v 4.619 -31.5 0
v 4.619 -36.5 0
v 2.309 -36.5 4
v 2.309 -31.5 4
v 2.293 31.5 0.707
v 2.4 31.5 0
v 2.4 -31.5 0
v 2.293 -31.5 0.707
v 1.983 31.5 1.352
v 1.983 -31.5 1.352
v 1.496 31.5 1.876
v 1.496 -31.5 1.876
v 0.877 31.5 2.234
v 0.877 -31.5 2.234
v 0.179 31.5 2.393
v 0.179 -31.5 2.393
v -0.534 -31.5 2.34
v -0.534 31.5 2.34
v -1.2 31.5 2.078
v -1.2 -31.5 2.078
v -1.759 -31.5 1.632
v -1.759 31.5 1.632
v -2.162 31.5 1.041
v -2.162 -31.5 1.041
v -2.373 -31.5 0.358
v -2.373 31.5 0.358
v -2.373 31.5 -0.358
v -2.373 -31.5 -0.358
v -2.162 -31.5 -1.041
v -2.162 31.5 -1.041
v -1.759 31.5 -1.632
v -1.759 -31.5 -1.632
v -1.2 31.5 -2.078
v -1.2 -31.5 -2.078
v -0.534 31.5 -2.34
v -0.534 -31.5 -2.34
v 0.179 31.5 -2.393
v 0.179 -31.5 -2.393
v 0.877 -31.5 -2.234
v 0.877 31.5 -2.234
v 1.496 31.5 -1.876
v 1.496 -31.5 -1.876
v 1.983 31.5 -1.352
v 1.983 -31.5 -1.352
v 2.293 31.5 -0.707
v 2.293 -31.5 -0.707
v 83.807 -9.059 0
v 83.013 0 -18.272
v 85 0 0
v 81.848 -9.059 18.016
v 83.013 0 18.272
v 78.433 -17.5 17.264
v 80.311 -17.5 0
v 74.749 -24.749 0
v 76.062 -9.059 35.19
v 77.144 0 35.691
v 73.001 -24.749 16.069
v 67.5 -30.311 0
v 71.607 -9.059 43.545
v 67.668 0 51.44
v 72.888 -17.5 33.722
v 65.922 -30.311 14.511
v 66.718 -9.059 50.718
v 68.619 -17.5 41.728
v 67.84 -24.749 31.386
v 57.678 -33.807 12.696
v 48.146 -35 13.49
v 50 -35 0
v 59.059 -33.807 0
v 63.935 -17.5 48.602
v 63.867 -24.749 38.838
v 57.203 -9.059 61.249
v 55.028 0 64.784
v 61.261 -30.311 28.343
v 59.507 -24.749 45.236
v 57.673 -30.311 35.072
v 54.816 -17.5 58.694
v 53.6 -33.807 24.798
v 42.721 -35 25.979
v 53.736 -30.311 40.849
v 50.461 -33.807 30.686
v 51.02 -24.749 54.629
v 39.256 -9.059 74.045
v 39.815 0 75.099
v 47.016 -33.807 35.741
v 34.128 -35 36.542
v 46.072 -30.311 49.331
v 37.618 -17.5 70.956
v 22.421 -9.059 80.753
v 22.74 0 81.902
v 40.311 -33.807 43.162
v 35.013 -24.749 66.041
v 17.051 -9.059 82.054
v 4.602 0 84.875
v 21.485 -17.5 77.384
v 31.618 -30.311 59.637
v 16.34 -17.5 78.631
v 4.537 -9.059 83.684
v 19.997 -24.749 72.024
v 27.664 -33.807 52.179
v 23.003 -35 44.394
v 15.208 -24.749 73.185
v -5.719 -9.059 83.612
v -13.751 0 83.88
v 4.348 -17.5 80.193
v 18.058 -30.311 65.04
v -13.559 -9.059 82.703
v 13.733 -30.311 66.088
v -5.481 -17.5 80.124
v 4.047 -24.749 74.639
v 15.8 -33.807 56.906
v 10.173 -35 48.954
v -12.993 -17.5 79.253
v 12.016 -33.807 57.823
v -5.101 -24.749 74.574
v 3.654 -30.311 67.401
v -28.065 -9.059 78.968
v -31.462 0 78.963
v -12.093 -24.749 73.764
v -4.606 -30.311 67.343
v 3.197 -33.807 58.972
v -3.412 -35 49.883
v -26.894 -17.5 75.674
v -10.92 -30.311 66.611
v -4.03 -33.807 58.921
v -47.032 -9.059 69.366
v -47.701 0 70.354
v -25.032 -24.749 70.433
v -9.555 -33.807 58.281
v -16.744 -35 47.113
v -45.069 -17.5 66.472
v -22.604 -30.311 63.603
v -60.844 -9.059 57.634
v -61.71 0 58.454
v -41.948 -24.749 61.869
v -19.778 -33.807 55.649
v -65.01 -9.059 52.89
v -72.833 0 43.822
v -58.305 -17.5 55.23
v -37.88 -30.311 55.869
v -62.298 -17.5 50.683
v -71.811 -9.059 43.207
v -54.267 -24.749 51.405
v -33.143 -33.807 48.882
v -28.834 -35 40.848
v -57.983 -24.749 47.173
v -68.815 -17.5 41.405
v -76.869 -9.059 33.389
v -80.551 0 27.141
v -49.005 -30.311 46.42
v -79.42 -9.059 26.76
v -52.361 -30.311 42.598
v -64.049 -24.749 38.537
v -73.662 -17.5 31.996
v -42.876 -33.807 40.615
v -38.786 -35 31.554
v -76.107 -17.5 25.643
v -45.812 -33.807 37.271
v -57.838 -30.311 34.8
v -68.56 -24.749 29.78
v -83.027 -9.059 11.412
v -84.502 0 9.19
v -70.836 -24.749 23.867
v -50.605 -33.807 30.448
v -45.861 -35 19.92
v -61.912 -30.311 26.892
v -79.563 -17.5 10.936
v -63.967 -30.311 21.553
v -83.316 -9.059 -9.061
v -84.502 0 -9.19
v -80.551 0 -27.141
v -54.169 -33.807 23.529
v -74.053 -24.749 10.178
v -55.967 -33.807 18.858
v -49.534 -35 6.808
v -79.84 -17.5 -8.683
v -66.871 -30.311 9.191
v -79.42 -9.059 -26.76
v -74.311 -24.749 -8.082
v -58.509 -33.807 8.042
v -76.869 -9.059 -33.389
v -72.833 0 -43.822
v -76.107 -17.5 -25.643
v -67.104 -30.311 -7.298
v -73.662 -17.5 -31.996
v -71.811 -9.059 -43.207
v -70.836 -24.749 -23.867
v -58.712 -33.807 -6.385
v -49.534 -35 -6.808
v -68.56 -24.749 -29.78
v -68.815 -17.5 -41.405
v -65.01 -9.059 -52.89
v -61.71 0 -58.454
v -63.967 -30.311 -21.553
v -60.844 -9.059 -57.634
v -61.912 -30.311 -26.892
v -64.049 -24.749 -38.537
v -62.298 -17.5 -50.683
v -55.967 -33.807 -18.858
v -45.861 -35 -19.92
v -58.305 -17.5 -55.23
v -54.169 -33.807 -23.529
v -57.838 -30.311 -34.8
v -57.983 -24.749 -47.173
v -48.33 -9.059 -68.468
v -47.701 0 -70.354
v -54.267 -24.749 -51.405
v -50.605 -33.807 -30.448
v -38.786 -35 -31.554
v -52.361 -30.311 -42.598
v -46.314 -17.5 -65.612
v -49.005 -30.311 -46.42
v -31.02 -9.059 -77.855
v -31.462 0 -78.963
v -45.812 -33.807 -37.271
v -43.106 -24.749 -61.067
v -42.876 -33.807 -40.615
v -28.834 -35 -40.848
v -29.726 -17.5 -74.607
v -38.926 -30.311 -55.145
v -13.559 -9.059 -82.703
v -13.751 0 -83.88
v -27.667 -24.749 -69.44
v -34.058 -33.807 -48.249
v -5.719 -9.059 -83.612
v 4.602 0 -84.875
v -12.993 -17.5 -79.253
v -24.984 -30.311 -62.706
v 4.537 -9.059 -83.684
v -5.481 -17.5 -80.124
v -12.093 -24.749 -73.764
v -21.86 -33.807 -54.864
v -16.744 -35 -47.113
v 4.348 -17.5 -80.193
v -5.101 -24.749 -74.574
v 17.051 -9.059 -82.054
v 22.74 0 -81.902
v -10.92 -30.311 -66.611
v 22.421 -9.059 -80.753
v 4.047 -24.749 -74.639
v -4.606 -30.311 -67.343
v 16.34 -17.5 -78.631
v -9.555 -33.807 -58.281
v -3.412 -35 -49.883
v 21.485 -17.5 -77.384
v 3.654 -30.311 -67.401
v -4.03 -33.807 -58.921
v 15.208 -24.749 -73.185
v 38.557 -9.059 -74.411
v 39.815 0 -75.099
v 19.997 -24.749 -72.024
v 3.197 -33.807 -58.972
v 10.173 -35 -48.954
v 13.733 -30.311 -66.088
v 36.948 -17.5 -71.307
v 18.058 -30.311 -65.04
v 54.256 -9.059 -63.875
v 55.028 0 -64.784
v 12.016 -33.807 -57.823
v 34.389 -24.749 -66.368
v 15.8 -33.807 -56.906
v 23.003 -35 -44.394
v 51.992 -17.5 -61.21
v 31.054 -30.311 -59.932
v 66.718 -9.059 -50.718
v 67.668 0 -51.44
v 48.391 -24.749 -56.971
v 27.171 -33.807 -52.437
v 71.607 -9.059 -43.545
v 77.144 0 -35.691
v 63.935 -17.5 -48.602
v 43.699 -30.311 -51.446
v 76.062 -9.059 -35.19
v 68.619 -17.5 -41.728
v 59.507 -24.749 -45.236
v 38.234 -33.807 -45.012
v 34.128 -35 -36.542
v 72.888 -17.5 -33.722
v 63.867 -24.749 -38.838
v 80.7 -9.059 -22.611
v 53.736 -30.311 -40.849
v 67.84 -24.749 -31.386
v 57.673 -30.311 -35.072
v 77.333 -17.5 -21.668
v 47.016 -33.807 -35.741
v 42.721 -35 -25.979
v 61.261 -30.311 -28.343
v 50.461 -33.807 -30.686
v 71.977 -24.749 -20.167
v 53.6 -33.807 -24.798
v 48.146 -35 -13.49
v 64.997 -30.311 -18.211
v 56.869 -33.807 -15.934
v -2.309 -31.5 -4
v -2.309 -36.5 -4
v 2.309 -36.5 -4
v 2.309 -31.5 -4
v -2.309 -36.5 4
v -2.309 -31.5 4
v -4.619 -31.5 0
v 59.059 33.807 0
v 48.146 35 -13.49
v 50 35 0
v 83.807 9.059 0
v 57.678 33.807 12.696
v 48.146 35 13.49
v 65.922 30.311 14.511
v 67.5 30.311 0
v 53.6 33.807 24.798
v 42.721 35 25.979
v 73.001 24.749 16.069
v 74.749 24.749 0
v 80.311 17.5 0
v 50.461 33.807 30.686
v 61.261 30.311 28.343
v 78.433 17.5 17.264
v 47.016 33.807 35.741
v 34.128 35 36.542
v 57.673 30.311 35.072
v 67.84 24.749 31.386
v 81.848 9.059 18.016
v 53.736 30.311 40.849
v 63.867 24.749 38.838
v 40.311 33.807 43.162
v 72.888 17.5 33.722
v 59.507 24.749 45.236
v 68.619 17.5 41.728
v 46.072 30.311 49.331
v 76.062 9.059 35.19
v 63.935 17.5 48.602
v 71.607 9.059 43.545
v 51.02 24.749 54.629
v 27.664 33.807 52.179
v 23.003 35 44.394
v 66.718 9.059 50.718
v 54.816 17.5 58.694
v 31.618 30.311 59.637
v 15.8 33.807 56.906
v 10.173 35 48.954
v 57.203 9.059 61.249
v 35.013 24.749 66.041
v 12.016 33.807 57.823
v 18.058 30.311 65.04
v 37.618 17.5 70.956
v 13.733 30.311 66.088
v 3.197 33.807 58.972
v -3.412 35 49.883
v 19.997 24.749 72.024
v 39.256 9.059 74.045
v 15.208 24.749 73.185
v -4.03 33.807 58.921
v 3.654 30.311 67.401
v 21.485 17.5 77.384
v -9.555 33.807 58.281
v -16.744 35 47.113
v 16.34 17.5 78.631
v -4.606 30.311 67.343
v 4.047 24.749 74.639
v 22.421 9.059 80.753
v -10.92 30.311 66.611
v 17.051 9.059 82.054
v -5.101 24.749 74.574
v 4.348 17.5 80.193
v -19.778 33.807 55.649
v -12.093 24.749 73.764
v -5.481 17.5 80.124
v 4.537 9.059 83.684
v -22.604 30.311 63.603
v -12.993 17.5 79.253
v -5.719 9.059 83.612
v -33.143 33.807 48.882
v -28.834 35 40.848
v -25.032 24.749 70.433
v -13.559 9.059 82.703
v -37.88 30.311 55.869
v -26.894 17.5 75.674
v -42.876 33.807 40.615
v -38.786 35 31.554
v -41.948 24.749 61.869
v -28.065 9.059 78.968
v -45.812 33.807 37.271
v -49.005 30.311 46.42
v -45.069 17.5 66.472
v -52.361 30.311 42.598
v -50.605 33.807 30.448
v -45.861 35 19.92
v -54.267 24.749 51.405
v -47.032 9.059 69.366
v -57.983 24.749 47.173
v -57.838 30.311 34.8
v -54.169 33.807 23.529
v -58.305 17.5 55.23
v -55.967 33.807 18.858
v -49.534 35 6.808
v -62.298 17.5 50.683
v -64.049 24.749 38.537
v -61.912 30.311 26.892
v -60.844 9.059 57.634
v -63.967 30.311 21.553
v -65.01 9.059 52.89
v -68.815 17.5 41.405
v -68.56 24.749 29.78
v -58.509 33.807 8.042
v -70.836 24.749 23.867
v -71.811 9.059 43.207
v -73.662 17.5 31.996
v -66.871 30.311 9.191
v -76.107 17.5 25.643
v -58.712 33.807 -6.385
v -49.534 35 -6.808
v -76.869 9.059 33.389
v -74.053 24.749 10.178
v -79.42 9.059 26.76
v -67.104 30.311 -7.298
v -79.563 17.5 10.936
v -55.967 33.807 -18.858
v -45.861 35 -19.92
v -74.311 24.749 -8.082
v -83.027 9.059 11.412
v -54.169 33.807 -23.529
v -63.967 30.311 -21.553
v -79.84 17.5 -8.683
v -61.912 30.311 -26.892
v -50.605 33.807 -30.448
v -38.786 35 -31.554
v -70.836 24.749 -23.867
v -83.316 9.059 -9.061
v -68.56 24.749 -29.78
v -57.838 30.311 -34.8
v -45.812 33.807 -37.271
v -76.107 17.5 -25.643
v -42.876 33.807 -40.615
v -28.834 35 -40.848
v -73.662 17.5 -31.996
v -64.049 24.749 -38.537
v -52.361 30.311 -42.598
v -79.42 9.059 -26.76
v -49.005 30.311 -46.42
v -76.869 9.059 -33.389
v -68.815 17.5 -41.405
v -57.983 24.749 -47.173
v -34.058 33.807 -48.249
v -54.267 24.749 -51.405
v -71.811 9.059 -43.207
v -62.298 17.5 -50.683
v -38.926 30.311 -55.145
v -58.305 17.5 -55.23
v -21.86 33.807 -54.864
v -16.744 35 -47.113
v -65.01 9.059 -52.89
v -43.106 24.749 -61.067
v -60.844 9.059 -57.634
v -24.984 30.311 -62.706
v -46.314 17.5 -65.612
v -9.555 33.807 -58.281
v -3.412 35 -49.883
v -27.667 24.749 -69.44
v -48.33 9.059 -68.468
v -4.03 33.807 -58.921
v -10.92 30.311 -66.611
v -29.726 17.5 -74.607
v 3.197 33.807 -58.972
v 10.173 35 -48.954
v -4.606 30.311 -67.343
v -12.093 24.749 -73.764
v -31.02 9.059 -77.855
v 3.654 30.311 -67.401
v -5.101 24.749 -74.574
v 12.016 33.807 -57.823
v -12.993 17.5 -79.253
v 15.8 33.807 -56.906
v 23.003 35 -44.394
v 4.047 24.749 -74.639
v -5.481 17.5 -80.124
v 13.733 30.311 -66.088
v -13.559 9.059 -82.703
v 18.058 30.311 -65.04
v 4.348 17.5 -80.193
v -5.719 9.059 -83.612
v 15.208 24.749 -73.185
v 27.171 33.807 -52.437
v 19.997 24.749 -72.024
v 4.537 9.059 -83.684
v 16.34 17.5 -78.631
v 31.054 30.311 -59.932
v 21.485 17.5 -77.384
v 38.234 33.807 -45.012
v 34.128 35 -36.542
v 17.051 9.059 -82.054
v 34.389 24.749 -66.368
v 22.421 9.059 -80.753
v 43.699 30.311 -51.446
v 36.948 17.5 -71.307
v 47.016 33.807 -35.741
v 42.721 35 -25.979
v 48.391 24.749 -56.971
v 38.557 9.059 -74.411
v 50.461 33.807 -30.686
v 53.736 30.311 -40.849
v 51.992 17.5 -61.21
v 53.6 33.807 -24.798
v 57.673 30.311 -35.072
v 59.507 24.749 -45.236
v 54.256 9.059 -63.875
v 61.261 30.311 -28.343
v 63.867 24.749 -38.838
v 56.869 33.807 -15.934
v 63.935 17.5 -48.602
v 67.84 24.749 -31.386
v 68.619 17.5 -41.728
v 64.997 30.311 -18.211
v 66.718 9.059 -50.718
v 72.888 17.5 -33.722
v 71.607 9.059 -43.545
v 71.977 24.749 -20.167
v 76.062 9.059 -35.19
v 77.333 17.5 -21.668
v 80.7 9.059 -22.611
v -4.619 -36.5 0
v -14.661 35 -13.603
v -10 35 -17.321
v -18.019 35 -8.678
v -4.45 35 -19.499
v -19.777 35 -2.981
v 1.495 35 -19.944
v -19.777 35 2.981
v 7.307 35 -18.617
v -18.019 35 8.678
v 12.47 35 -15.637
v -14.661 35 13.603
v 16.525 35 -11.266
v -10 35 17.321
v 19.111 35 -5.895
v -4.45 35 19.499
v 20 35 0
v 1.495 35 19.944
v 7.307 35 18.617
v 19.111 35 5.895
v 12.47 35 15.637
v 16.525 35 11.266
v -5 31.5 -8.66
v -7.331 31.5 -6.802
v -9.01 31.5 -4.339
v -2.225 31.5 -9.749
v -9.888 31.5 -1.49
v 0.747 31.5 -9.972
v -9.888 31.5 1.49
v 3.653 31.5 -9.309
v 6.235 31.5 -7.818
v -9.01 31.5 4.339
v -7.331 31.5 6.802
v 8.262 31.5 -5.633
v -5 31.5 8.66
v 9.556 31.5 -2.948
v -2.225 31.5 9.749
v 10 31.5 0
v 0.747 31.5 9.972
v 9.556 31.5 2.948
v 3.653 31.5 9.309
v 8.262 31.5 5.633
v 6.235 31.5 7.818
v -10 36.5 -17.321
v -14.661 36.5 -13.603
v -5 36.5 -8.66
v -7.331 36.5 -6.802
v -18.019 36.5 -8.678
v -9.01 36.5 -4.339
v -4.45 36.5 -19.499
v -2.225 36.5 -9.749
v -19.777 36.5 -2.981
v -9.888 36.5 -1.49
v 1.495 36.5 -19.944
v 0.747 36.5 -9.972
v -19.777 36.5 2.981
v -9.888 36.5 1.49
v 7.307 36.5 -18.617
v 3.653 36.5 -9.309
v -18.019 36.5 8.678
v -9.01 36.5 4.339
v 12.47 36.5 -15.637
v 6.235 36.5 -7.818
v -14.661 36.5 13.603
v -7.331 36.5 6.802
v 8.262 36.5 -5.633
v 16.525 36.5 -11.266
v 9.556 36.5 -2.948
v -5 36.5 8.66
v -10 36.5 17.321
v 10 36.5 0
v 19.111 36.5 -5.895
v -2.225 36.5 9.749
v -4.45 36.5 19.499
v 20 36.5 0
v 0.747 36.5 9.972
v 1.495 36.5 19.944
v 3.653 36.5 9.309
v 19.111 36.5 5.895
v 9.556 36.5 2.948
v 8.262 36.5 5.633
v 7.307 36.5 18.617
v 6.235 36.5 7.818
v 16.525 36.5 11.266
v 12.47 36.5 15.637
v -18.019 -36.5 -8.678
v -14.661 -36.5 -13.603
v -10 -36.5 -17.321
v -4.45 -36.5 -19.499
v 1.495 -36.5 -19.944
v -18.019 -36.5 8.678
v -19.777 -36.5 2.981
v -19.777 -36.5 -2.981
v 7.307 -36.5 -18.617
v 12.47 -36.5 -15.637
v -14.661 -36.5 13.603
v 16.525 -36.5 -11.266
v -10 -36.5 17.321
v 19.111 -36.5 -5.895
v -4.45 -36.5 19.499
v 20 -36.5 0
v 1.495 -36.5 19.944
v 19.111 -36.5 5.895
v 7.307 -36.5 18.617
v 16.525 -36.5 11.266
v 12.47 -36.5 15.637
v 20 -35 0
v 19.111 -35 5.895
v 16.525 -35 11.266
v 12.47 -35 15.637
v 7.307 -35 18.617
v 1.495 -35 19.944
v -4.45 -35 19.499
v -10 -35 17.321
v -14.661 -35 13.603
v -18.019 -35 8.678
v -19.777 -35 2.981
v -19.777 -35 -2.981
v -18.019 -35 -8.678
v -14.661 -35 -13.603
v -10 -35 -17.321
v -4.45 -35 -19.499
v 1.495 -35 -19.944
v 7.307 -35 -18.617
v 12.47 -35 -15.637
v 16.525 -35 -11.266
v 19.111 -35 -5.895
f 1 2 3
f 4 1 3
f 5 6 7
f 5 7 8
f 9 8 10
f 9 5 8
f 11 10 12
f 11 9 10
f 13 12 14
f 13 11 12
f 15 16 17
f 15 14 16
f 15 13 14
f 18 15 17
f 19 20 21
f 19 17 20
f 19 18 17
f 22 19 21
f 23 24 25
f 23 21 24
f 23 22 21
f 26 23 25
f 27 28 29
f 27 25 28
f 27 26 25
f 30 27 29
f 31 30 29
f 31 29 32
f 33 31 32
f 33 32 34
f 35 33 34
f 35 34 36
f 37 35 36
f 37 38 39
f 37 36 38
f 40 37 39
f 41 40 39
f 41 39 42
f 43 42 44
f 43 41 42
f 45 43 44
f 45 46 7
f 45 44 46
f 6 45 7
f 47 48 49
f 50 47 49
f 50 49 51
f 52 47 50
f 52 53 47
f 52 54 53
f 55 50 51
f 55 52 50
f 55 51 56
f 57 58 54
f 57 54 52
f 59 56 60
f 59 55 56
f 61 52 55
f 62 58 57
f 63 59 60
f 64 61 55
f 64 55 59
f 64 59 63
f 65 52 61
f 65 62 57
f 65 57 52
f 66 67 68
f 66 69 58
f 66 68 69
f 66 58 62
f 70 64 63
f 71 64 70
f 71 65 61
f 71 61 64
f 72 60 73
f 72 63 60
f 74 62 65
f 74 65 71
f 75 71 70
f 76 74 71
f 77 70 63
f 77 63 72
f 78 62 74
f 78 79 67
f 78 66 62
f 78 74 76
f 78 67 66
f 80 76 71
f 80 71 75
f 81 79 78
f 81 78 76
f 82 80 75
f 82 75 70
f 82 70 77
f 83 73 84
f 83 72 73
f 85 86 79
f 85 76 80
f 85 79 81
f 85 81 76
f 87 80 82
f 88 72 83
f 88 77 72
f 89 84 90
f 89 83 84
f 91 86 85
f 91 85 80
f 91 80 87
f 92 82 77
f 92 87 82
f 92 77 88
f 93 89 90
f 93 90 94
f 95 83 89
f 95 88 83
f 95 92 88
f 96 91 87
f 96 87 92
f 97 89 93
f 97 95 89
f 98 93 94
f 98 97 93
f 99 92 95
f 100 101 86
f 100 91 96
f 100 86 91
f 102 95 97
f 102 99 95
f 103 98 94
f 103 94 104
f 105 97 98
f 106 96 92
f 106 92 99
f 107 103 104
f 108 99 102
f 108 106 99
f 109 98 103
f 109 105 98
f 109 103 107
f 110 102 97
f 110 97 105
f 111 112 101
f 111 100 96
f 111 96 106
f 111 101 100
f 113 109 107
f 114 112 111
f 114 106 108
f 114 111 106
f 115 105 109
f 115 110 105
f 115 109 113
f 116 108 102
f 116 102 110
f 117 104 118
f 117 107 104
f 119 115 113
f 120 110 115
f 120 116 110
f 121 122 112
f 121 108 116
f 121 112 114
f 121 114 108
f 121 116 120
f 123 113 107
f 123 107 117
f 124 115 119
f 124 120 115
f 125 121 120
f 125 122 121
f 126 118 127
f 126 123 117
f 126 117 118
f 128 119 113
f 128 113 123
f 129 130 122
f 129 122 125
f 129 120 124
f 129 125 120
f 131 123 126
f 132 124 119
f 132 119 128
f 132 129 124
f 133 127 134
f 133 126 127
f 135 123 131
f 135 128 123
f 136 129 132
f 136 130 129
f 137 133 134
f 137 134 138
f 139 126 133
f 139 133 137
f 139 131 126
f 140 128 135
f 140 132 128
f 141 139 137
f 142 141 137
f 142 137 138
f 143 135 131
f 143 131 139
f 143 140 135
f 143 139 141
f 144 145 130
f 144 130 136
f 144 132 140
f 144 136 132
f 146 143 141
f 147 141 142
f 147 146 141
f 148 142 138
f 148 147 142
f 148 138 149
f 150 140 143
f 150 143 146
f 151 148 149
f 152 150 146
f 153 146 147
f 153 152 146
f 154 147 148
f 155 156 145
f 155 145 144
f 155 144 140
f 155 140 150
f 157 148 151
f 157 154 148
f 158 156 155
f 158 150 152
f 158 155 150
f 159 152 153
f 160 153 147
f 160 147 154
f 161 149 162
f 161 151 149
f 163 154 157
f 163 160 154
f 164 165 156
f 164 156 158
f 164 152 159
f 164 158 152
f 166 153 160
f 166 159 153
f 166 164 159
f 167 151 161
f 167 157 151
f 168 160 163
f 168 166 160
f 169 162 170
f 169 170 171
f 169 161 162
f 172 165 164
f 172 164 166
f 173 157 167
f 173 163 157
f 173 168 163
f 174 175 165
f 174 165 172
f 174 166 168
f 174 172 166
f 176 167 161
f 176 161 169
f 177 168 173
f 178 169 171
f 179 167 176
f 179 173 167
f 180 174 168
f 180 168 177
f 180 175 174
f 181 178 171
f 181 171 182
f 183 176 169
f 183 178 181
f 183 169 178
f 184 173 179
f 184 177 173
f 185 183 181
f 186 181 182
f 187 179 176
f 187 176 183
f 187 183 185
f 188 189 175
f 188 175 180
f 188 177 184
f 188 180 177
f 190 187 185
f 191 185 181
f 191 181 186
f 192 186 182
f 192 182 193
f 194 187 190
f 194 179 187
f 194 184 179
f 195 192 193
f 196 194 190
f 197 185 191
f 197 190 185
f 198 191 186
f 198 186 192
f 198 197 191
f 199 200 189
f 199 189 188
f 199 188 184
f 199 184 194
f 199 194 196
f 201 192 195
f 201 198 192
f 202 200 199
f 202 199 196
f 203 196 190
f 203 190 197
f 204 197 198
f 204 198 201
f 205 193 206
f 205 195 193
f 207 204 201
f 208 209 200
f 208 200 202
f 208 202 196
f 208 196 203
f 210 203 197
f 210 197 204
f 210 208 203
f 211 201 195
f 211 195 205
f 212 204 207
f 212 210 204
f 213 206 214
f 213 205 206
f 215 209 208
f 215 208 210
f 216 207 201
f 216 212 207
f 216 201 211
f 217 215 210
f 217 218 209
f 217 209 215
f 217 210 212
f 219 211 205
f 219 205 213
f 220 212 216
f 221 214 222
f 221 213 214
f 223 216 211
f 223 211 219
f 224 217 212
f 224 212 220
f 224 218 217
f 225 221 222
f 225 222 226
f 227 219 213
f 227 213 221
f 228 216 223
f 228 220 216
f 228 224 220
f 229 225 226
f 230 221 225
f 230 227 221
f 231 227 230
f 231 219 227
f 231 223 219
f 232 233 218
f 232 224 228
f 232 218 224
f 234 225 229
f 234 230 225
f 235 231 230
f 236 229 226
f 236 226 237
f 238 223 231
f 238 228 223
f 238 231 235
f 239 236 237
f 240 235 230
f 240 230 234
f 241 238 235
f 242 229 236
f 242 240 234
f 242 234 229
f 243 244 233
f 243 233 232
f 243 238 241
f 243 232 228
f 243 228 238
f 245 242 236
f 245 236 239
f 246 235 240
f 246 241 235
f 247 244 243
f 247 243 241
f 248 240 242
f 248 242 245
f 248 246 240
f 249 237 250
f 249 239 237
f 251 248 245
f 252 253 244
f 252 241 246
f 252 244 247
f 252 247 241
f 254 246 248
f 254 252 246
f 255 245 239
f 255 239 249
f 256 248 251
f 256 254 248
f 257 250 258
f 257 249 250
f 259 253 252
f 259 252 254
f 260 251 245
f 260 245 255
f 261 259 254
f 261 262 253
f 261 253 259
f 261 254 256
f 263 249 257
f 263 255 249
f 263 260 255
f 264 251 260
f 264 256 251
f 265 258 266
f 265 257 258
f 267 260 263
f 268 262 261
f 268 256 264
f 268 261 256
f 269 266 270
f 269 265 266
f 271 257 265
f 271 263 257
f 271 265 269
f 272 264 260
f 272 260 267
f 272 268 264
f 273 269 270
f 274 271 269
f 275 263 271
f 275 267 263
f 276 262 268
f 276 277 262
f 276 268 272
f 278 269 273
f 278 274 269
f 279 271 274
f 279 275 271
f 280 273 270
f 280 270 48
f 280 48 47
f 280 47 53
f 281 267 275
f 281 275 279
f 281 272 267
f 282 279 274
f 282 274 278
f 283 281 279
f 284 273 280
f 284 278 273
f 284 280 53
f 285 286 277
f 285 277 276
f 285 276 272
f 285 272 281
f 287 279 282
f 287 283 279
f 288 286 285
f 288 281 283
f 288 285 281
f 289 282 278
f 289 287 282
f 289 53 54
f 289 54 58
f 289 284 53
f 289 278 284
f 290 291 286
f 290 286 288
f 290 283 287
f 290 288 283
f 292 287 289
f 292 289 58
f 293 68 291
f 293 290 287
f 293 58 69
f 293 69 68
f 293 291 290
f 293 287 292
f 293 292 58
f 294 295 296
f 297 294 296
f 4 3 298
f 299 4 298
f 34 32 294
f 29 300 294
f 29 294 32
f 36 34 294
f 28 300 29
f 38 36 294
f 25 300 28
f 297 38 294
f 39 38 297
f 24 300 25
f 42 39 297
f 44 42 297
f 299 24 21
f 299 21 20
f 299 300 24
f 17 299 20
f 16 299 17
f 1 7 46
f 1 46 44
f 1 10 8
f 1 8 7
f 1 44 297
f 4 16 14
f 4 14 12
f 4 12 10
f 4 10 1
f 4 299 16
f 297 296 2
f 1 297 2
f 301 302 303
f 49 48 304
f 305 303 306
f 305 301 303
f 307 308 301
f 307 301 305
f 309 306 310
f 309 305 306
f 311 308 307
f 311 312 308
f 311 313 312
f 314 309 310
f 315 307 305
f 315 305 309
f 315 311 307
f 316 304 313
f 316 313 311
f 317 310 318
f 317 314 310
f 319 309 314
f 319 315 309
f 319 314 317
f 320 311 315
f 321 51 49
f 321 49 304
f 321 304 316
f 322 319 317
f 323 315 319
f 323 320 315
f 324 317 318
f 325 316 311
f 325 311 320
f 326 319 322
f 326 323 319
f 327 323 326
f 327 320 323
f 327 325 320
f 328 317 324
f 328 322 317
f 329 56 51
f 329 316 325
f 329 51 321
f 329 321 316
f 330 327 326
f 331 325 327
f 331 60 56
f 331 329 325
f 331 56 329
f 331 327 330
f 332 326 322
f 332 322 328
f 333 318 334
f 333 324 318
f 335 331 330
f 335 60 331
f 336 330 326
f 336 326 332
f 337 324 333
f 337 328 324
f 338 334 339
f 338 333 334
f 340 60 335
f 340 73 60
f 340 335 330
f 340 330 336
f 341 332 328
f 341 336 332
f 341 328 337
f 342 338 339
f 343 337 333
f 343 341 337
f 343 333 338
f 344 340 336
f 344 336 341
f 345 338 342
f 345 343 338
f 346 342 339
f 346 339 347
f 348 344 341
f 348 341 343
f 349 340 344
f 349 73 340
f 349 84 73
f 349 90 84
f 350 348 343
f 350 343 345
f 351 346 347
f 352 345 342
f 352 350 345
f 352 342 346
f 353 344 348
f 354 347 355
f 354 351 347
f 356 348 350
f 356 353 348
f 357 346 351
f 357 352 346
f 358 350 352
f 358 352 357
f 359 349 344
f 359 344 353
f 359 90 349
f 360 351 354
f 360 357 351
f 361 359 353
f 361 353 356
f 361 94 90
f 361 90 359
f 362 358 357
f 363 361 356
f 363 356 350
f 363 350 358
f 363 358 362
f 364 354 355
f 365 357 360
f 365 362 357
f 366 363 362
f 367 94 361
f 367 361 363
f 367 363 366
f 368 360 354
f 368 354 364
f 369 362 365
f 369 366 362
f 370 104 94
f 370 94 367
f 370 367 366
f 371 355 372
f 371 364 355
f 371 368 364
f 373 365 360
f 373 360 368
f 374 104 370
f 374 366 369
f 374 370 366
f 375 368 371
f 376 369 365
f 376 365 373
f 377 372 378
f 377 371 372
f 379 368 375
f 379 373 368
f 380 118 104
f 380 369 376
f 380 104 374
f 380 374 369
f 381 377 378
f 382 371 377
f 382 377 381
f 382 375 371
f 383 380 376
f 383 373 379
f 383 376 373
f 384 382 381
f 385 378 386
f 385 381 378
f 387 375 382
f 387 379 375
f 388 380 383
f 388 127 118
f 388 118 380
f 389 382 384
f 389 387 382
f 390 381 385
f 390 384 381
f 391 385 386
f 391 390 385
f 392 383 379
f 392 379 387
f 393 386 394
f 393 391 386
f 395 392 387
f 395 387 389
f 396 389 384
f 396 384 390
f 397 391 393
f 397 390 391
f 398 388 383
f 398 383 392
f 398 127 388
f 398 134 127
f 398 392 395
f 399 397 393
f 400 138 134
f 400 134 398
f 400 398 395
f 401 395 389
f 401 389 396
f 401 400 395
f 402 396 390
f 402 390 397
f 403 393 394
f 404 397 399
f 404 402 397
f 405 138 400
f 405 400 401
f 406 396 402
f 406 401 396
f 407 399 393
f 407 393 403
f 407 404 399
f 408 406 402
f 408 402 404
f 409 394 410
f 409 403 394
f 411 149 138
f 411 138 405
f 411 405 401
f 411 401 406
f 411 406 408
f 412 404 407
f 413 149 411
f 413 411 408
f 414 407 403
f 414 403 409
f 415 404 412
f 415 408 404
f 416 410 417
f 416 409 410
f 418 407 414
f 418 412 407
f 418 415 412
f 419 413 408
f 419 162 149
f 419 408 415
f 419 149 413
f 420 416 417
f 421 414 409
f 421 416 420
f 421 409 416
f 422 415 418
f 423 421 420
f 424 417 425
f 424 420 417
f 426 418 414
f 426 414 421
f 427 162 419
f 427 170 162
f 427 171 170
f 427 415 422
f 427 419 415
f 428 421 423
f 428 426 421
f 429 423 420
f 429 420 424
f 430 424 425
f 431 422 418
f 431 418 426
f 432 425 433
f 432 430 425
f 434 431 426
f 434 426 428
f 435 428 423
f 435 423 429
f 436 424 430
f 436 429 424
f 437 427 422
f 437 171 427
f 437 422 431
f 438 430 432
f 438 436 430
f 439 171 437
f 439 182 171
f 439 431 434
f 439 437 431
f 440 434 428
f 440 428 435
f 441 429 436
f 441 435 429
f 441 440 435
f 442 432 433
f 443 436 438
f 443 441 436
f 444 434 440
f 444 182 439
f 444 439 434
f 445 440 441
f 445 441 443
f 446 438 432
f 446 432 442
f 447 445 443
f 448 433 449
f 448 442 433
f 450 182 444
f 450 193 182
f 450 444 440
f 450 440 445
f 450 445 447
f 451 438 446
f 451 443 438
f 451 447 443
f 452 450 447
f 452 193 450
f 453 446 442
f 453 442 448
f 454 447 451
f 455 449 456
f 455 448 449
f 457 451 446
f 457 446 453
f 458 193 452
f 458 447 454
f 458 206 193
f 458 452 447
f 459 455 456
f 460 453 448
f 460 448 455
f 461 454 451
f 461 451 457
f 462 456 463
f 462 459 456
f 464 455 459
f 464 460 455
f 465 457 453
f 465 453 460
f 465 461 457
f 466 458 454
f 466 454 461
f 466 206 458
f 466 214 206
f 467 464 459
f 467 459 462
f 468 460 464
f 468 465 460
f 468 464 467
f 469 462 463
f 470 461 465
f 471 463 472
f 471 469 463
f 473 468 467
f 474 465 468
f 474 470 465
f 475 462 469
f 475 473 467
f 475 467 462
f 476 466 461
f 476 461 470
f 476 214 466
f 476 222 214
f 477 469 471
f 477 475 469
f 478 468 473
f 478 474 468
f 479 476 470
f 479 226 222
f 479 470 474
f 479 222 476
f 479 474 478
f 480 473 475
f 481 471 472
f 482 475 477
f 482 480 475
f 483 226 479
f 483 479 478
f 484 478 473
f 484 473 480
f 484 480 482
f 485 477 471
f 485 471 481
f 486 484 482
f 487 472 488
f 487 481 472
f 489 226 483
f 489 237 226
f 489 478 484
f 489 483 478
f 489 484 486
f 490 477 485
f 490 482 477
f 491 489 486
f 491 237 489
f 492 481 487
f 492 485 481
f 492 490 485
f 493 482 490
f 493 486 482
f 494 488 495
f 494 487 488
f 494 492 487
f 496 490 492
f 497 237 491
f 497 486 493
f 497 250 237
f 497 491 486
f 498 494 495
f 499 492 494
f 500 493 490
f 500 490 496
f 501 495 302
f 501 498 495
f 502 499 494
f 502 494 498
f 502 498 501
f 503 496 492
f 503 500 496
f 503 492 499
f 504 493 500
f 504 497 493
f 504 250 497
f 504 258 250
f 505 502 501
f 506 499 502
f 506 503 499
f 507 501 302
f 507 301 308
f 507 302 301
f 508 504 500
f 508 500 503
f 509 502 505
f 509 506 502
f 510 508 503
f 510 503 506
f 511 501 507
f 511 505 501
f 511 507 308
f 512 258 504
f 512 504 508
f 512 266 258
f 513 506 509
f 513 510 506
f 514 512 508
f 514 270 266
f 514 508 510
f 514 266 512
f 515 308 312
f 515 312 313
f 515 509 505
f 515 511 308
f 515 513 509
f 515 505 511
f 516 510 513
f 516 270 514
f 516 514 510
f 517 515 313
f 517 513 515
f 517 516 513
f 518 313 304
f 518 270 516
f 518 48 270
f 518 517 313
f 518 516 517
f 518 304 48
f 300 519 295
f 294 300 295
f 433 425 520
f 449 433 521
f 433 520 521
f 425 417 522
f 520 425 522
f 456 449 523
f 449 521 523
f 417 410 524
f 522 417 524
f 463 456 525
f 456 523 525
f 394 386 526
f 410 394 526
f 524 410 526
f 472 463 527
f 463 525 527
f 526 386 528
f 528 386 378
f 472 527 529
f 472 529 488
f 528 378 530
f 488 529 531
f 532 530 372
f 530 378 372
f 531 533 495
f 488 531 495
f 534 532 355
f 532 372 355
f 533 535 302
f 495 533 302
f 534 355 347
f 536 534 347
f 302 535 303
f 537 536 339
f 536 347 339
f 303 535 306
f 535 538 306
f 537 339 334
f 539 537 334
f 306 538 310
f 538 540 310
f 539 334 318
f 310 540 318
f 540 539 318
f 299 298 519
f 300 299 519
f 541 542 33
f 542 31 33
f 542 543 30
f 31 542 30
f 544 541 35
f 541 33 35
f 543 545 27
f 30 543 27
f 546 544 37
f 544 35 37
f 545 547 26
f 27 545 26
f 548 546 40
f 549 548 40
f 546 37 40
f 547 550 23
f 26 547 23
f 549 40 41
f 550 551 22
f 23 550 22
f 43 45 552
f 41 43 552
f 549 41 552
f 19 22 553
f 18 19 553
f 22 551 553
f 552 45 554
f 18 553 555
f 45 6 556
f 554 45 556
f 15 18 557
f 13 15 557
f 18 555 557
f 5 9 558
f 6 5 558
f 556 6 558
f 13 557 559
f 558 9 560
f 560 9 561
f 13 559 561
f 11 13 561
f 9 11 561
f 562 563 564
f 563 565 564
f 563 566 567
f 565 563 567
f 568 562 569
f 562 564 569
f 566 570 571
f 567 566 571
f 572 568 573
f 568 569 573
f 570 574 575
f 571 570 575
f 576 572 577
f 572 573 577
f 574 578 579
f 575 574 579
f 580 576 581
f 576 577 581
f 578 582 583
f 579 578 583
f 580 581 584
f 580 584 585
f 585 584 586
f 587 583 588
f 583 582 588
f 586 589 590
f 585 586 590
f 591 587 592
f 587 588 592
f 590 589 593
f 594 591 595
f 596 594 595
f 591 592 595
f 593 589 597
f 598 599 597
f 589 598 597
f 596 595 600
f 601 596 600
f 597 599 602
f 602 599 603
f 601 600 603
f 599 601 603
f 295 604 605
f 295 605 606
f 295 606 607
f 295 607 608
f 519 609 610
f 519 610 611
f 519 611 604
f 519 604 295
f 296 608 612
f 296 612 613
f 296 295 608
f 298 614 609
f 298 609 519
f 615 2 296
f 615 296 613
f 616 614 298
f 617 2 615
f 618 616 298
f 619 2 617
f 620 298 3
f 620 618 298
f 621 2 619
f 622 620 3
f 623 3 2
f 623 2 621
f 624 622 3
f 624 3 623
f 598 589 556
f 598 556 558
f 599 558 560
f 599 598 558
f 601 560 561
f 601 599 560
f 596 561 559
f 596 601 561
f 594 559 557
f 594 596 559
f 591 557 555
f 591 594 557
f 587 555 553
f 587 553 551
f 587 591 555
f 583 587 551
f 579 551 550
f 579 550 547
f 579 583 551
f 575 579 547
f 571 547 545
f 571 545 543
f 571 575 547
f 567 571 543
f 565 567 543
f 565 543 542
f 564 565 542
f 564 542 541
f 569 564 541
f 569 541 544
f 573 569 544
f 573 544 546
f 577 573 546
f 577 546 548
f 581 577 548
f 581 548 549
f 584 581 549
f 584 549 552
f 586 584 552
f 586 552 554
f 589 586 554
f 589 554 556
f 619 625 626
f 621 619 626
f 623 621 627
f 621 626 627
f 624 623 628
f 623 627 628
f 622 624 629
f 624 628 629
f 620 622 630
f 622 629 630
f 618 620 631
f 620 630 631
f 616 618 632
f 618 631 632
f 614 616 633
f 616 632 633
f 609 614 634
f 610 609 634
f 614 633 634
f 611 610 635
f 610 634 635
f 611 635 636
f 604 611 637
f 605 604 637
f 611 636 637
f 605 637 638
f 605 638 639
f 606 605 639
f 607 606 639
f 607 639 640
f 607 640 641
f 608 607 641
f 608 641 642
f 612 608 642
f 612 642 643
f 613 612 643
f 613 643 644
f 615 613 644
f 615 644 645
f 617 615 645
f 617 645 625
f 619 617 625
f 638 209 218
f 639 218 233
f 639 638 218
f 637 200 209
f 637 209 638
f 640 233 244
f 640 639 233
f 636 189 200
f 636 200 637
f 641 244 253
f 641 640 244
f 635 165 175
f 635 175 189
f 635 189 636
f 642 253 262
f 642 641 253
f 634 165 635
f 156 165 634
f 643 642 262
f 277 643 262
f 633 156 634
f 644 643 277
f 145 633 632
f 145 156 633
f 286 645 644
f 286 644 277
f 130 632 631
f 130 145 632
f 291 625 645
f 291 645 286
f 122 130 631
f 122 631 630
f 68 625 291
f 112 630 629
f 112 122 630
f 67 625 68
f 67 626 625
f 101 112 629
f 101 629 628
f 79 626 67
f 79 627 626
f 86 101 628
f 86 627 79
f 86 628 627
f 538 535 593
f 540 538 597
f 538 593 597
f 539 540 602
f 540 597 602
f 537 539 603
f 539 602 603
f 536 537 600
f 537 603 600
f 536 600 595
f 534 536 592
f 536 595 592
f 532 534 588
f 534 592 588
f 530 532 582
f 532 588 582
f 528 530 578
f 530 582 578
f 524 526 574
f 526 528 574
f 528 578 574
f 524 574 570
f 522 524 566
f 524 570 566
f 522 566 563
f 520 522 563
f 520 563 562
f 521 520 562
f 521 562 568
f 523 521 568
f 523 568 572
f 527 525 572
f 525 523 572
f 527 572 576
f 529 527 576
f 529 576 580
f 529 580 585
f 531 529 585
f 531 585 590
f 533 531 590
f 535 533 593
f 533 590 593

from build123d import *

# Parameters (mm, degrees)
PAD014_DEPTH           = 5
CYLINDER018_R          = 10
CYLINDER018_DEPTH      = 68.5
CYLINDER018_ROLL_ANGLE = 90
CYLINDER001_R          = 2.4
CYLINDER001_DEPTH      = 200
CYLINDER001_ROLL_ANGLE = 90
CYLINDER017_R          = 20
CYLINDER017_DEPTH      = 73
CYLINDER017_ROLL_ANGLE = 90
CYLINDER_R             = 50
CYLINDER_DEPTH         = 70
CYLINDER_ROLL_ANGLE    = 90
TORUS_R                = 35
TORUS_ROLL_ANGLE       = 90


with BuildPart() as pad014:
    # Sketch011 → Pad014 (new body)
    with BuildSketch(Plane.XZ.offset(36.5)):
        Polygon((4.618802, 0), (2.309401, 4), (-2.309401, 4), (-4.618802, 0), (-2.309401, -4), (2.309401, -4), align=None)
    extrude(amount=-PAD014_DEPTH)


with BuildPart() as cilindro018:
    # Cylinder018 → Cylinder018 (new body)
    with BuildSketch(Plane.XY):
        Circle(CYLINDER018_R)
    extrude(amount=CYLINDER018_DEPTH)


with BuildPart() as cilindro018_1:
    # Cylinder018 roll: moved
    add(cilindro018.part.rotate(Axis((0, 0, 0), (1, 0, 0)), CYLINDER018_ROLL_ANGLE))


with BuildPart() as cilindro018_2:
    # Cylinder018 placement: moved
    add(cilindro018_1.part.moved(Location((0, 100, 0))))


with BuildPart() as cilindro001:
    # Cylinder001 → Cylinder001 (new body)
    with BuildSketch(Plane.XY):
        Circle(CYLINDER001_R)
    extrude(amount=CYLINDER001_DEPTH)


with BuildPart() as cilindro001_1:
    # Cylinder001 roll: moved
    add(cilindro001.part.rotate(Axis((0, 0, 0), (1, 0, 0)), CYLINDER001_ROLL_ANGLE))


with BuildPart() as cilindro001_2:
    # Cylinder001 placement: moved
    add(cilindro001_1.part.moved(Location((0, 100, 0))))


with BuildPart() as cilindro017:
    # Cylinder017 → Cylinder017 (new body)
    with BuildSketch(Plane.XY):
        Circle(CYLINDER017_R)
    extrude(amount=CYLINDER017_DEPTH)


with BuildPart() as cilindro017_1:
    # Cylinder017 roll: moved
    add(cilindro017.part.rotate(Axis((0, 0, 0), (1, 0, 0)), CYLINDER017_ROLL_ANGLE))


with BuildPart() as cilindro017_2:
    # Cylinder017 placement: moved
    add(cilindro017_1.part.moved(Location((0, 36.5, 0))))


with BuildPart() as cilindro:
    # Cylinder → Cylinder (new body)
    with BuildSketch(Plane.XY):
        Circle(CYLINDER_R)
    extrude(amount=CYLINDER_DEPTH)


with BuildPart() as cilindro_1:
    # Cylinder roll: moved
    add(cilindro.part.rotate(Axis((0, 0, 0), (1, 0, 0)), CYLINDER_ROLL_ANGLE))


with BuildPart() as cilindro_2:
    # Cylinder placement: moved
    add(cilindro_1.part.moved(Location((0, 35, 0))))


with BuildPart() as cut017:
    # Torus → Torus (revolve)
    with BuildSketch(Plane.XZ):
        with Locations((50, 0)):
            Circle(TORUS_R)
    revolve(axis=Axis((0, 0, 0), (0, 0, 1)))


with BuildPart() as cut017_1:
    # Torus roll: moved
    add(cut017.part.rotate(Axis((0, 0, 0), (1, 0, 0)), TORUS_ROLL_ANGLE))


with BuildPart() as cut017_2:
    # Torus placement: moved
    add(cut017_1.part)

    # Fusion: union Cilindro
    add(cilindro_2.part)

    # Fusion016: union Cilindro017
    add(cilindro017_2.part)

    # Cut011: cut Cilindro001
    add(cilindro001_2.part, mode=Mode.SUBTRACT)

    # Cut012: cut Cilindro018
    add(cilindro018_2.part, mode=Mode.SUBTRACT)

    # Cut017: cut Pad014
    add(pad014.part, mode=Mode.SUBTRACT)


solid = cut017_2.part
